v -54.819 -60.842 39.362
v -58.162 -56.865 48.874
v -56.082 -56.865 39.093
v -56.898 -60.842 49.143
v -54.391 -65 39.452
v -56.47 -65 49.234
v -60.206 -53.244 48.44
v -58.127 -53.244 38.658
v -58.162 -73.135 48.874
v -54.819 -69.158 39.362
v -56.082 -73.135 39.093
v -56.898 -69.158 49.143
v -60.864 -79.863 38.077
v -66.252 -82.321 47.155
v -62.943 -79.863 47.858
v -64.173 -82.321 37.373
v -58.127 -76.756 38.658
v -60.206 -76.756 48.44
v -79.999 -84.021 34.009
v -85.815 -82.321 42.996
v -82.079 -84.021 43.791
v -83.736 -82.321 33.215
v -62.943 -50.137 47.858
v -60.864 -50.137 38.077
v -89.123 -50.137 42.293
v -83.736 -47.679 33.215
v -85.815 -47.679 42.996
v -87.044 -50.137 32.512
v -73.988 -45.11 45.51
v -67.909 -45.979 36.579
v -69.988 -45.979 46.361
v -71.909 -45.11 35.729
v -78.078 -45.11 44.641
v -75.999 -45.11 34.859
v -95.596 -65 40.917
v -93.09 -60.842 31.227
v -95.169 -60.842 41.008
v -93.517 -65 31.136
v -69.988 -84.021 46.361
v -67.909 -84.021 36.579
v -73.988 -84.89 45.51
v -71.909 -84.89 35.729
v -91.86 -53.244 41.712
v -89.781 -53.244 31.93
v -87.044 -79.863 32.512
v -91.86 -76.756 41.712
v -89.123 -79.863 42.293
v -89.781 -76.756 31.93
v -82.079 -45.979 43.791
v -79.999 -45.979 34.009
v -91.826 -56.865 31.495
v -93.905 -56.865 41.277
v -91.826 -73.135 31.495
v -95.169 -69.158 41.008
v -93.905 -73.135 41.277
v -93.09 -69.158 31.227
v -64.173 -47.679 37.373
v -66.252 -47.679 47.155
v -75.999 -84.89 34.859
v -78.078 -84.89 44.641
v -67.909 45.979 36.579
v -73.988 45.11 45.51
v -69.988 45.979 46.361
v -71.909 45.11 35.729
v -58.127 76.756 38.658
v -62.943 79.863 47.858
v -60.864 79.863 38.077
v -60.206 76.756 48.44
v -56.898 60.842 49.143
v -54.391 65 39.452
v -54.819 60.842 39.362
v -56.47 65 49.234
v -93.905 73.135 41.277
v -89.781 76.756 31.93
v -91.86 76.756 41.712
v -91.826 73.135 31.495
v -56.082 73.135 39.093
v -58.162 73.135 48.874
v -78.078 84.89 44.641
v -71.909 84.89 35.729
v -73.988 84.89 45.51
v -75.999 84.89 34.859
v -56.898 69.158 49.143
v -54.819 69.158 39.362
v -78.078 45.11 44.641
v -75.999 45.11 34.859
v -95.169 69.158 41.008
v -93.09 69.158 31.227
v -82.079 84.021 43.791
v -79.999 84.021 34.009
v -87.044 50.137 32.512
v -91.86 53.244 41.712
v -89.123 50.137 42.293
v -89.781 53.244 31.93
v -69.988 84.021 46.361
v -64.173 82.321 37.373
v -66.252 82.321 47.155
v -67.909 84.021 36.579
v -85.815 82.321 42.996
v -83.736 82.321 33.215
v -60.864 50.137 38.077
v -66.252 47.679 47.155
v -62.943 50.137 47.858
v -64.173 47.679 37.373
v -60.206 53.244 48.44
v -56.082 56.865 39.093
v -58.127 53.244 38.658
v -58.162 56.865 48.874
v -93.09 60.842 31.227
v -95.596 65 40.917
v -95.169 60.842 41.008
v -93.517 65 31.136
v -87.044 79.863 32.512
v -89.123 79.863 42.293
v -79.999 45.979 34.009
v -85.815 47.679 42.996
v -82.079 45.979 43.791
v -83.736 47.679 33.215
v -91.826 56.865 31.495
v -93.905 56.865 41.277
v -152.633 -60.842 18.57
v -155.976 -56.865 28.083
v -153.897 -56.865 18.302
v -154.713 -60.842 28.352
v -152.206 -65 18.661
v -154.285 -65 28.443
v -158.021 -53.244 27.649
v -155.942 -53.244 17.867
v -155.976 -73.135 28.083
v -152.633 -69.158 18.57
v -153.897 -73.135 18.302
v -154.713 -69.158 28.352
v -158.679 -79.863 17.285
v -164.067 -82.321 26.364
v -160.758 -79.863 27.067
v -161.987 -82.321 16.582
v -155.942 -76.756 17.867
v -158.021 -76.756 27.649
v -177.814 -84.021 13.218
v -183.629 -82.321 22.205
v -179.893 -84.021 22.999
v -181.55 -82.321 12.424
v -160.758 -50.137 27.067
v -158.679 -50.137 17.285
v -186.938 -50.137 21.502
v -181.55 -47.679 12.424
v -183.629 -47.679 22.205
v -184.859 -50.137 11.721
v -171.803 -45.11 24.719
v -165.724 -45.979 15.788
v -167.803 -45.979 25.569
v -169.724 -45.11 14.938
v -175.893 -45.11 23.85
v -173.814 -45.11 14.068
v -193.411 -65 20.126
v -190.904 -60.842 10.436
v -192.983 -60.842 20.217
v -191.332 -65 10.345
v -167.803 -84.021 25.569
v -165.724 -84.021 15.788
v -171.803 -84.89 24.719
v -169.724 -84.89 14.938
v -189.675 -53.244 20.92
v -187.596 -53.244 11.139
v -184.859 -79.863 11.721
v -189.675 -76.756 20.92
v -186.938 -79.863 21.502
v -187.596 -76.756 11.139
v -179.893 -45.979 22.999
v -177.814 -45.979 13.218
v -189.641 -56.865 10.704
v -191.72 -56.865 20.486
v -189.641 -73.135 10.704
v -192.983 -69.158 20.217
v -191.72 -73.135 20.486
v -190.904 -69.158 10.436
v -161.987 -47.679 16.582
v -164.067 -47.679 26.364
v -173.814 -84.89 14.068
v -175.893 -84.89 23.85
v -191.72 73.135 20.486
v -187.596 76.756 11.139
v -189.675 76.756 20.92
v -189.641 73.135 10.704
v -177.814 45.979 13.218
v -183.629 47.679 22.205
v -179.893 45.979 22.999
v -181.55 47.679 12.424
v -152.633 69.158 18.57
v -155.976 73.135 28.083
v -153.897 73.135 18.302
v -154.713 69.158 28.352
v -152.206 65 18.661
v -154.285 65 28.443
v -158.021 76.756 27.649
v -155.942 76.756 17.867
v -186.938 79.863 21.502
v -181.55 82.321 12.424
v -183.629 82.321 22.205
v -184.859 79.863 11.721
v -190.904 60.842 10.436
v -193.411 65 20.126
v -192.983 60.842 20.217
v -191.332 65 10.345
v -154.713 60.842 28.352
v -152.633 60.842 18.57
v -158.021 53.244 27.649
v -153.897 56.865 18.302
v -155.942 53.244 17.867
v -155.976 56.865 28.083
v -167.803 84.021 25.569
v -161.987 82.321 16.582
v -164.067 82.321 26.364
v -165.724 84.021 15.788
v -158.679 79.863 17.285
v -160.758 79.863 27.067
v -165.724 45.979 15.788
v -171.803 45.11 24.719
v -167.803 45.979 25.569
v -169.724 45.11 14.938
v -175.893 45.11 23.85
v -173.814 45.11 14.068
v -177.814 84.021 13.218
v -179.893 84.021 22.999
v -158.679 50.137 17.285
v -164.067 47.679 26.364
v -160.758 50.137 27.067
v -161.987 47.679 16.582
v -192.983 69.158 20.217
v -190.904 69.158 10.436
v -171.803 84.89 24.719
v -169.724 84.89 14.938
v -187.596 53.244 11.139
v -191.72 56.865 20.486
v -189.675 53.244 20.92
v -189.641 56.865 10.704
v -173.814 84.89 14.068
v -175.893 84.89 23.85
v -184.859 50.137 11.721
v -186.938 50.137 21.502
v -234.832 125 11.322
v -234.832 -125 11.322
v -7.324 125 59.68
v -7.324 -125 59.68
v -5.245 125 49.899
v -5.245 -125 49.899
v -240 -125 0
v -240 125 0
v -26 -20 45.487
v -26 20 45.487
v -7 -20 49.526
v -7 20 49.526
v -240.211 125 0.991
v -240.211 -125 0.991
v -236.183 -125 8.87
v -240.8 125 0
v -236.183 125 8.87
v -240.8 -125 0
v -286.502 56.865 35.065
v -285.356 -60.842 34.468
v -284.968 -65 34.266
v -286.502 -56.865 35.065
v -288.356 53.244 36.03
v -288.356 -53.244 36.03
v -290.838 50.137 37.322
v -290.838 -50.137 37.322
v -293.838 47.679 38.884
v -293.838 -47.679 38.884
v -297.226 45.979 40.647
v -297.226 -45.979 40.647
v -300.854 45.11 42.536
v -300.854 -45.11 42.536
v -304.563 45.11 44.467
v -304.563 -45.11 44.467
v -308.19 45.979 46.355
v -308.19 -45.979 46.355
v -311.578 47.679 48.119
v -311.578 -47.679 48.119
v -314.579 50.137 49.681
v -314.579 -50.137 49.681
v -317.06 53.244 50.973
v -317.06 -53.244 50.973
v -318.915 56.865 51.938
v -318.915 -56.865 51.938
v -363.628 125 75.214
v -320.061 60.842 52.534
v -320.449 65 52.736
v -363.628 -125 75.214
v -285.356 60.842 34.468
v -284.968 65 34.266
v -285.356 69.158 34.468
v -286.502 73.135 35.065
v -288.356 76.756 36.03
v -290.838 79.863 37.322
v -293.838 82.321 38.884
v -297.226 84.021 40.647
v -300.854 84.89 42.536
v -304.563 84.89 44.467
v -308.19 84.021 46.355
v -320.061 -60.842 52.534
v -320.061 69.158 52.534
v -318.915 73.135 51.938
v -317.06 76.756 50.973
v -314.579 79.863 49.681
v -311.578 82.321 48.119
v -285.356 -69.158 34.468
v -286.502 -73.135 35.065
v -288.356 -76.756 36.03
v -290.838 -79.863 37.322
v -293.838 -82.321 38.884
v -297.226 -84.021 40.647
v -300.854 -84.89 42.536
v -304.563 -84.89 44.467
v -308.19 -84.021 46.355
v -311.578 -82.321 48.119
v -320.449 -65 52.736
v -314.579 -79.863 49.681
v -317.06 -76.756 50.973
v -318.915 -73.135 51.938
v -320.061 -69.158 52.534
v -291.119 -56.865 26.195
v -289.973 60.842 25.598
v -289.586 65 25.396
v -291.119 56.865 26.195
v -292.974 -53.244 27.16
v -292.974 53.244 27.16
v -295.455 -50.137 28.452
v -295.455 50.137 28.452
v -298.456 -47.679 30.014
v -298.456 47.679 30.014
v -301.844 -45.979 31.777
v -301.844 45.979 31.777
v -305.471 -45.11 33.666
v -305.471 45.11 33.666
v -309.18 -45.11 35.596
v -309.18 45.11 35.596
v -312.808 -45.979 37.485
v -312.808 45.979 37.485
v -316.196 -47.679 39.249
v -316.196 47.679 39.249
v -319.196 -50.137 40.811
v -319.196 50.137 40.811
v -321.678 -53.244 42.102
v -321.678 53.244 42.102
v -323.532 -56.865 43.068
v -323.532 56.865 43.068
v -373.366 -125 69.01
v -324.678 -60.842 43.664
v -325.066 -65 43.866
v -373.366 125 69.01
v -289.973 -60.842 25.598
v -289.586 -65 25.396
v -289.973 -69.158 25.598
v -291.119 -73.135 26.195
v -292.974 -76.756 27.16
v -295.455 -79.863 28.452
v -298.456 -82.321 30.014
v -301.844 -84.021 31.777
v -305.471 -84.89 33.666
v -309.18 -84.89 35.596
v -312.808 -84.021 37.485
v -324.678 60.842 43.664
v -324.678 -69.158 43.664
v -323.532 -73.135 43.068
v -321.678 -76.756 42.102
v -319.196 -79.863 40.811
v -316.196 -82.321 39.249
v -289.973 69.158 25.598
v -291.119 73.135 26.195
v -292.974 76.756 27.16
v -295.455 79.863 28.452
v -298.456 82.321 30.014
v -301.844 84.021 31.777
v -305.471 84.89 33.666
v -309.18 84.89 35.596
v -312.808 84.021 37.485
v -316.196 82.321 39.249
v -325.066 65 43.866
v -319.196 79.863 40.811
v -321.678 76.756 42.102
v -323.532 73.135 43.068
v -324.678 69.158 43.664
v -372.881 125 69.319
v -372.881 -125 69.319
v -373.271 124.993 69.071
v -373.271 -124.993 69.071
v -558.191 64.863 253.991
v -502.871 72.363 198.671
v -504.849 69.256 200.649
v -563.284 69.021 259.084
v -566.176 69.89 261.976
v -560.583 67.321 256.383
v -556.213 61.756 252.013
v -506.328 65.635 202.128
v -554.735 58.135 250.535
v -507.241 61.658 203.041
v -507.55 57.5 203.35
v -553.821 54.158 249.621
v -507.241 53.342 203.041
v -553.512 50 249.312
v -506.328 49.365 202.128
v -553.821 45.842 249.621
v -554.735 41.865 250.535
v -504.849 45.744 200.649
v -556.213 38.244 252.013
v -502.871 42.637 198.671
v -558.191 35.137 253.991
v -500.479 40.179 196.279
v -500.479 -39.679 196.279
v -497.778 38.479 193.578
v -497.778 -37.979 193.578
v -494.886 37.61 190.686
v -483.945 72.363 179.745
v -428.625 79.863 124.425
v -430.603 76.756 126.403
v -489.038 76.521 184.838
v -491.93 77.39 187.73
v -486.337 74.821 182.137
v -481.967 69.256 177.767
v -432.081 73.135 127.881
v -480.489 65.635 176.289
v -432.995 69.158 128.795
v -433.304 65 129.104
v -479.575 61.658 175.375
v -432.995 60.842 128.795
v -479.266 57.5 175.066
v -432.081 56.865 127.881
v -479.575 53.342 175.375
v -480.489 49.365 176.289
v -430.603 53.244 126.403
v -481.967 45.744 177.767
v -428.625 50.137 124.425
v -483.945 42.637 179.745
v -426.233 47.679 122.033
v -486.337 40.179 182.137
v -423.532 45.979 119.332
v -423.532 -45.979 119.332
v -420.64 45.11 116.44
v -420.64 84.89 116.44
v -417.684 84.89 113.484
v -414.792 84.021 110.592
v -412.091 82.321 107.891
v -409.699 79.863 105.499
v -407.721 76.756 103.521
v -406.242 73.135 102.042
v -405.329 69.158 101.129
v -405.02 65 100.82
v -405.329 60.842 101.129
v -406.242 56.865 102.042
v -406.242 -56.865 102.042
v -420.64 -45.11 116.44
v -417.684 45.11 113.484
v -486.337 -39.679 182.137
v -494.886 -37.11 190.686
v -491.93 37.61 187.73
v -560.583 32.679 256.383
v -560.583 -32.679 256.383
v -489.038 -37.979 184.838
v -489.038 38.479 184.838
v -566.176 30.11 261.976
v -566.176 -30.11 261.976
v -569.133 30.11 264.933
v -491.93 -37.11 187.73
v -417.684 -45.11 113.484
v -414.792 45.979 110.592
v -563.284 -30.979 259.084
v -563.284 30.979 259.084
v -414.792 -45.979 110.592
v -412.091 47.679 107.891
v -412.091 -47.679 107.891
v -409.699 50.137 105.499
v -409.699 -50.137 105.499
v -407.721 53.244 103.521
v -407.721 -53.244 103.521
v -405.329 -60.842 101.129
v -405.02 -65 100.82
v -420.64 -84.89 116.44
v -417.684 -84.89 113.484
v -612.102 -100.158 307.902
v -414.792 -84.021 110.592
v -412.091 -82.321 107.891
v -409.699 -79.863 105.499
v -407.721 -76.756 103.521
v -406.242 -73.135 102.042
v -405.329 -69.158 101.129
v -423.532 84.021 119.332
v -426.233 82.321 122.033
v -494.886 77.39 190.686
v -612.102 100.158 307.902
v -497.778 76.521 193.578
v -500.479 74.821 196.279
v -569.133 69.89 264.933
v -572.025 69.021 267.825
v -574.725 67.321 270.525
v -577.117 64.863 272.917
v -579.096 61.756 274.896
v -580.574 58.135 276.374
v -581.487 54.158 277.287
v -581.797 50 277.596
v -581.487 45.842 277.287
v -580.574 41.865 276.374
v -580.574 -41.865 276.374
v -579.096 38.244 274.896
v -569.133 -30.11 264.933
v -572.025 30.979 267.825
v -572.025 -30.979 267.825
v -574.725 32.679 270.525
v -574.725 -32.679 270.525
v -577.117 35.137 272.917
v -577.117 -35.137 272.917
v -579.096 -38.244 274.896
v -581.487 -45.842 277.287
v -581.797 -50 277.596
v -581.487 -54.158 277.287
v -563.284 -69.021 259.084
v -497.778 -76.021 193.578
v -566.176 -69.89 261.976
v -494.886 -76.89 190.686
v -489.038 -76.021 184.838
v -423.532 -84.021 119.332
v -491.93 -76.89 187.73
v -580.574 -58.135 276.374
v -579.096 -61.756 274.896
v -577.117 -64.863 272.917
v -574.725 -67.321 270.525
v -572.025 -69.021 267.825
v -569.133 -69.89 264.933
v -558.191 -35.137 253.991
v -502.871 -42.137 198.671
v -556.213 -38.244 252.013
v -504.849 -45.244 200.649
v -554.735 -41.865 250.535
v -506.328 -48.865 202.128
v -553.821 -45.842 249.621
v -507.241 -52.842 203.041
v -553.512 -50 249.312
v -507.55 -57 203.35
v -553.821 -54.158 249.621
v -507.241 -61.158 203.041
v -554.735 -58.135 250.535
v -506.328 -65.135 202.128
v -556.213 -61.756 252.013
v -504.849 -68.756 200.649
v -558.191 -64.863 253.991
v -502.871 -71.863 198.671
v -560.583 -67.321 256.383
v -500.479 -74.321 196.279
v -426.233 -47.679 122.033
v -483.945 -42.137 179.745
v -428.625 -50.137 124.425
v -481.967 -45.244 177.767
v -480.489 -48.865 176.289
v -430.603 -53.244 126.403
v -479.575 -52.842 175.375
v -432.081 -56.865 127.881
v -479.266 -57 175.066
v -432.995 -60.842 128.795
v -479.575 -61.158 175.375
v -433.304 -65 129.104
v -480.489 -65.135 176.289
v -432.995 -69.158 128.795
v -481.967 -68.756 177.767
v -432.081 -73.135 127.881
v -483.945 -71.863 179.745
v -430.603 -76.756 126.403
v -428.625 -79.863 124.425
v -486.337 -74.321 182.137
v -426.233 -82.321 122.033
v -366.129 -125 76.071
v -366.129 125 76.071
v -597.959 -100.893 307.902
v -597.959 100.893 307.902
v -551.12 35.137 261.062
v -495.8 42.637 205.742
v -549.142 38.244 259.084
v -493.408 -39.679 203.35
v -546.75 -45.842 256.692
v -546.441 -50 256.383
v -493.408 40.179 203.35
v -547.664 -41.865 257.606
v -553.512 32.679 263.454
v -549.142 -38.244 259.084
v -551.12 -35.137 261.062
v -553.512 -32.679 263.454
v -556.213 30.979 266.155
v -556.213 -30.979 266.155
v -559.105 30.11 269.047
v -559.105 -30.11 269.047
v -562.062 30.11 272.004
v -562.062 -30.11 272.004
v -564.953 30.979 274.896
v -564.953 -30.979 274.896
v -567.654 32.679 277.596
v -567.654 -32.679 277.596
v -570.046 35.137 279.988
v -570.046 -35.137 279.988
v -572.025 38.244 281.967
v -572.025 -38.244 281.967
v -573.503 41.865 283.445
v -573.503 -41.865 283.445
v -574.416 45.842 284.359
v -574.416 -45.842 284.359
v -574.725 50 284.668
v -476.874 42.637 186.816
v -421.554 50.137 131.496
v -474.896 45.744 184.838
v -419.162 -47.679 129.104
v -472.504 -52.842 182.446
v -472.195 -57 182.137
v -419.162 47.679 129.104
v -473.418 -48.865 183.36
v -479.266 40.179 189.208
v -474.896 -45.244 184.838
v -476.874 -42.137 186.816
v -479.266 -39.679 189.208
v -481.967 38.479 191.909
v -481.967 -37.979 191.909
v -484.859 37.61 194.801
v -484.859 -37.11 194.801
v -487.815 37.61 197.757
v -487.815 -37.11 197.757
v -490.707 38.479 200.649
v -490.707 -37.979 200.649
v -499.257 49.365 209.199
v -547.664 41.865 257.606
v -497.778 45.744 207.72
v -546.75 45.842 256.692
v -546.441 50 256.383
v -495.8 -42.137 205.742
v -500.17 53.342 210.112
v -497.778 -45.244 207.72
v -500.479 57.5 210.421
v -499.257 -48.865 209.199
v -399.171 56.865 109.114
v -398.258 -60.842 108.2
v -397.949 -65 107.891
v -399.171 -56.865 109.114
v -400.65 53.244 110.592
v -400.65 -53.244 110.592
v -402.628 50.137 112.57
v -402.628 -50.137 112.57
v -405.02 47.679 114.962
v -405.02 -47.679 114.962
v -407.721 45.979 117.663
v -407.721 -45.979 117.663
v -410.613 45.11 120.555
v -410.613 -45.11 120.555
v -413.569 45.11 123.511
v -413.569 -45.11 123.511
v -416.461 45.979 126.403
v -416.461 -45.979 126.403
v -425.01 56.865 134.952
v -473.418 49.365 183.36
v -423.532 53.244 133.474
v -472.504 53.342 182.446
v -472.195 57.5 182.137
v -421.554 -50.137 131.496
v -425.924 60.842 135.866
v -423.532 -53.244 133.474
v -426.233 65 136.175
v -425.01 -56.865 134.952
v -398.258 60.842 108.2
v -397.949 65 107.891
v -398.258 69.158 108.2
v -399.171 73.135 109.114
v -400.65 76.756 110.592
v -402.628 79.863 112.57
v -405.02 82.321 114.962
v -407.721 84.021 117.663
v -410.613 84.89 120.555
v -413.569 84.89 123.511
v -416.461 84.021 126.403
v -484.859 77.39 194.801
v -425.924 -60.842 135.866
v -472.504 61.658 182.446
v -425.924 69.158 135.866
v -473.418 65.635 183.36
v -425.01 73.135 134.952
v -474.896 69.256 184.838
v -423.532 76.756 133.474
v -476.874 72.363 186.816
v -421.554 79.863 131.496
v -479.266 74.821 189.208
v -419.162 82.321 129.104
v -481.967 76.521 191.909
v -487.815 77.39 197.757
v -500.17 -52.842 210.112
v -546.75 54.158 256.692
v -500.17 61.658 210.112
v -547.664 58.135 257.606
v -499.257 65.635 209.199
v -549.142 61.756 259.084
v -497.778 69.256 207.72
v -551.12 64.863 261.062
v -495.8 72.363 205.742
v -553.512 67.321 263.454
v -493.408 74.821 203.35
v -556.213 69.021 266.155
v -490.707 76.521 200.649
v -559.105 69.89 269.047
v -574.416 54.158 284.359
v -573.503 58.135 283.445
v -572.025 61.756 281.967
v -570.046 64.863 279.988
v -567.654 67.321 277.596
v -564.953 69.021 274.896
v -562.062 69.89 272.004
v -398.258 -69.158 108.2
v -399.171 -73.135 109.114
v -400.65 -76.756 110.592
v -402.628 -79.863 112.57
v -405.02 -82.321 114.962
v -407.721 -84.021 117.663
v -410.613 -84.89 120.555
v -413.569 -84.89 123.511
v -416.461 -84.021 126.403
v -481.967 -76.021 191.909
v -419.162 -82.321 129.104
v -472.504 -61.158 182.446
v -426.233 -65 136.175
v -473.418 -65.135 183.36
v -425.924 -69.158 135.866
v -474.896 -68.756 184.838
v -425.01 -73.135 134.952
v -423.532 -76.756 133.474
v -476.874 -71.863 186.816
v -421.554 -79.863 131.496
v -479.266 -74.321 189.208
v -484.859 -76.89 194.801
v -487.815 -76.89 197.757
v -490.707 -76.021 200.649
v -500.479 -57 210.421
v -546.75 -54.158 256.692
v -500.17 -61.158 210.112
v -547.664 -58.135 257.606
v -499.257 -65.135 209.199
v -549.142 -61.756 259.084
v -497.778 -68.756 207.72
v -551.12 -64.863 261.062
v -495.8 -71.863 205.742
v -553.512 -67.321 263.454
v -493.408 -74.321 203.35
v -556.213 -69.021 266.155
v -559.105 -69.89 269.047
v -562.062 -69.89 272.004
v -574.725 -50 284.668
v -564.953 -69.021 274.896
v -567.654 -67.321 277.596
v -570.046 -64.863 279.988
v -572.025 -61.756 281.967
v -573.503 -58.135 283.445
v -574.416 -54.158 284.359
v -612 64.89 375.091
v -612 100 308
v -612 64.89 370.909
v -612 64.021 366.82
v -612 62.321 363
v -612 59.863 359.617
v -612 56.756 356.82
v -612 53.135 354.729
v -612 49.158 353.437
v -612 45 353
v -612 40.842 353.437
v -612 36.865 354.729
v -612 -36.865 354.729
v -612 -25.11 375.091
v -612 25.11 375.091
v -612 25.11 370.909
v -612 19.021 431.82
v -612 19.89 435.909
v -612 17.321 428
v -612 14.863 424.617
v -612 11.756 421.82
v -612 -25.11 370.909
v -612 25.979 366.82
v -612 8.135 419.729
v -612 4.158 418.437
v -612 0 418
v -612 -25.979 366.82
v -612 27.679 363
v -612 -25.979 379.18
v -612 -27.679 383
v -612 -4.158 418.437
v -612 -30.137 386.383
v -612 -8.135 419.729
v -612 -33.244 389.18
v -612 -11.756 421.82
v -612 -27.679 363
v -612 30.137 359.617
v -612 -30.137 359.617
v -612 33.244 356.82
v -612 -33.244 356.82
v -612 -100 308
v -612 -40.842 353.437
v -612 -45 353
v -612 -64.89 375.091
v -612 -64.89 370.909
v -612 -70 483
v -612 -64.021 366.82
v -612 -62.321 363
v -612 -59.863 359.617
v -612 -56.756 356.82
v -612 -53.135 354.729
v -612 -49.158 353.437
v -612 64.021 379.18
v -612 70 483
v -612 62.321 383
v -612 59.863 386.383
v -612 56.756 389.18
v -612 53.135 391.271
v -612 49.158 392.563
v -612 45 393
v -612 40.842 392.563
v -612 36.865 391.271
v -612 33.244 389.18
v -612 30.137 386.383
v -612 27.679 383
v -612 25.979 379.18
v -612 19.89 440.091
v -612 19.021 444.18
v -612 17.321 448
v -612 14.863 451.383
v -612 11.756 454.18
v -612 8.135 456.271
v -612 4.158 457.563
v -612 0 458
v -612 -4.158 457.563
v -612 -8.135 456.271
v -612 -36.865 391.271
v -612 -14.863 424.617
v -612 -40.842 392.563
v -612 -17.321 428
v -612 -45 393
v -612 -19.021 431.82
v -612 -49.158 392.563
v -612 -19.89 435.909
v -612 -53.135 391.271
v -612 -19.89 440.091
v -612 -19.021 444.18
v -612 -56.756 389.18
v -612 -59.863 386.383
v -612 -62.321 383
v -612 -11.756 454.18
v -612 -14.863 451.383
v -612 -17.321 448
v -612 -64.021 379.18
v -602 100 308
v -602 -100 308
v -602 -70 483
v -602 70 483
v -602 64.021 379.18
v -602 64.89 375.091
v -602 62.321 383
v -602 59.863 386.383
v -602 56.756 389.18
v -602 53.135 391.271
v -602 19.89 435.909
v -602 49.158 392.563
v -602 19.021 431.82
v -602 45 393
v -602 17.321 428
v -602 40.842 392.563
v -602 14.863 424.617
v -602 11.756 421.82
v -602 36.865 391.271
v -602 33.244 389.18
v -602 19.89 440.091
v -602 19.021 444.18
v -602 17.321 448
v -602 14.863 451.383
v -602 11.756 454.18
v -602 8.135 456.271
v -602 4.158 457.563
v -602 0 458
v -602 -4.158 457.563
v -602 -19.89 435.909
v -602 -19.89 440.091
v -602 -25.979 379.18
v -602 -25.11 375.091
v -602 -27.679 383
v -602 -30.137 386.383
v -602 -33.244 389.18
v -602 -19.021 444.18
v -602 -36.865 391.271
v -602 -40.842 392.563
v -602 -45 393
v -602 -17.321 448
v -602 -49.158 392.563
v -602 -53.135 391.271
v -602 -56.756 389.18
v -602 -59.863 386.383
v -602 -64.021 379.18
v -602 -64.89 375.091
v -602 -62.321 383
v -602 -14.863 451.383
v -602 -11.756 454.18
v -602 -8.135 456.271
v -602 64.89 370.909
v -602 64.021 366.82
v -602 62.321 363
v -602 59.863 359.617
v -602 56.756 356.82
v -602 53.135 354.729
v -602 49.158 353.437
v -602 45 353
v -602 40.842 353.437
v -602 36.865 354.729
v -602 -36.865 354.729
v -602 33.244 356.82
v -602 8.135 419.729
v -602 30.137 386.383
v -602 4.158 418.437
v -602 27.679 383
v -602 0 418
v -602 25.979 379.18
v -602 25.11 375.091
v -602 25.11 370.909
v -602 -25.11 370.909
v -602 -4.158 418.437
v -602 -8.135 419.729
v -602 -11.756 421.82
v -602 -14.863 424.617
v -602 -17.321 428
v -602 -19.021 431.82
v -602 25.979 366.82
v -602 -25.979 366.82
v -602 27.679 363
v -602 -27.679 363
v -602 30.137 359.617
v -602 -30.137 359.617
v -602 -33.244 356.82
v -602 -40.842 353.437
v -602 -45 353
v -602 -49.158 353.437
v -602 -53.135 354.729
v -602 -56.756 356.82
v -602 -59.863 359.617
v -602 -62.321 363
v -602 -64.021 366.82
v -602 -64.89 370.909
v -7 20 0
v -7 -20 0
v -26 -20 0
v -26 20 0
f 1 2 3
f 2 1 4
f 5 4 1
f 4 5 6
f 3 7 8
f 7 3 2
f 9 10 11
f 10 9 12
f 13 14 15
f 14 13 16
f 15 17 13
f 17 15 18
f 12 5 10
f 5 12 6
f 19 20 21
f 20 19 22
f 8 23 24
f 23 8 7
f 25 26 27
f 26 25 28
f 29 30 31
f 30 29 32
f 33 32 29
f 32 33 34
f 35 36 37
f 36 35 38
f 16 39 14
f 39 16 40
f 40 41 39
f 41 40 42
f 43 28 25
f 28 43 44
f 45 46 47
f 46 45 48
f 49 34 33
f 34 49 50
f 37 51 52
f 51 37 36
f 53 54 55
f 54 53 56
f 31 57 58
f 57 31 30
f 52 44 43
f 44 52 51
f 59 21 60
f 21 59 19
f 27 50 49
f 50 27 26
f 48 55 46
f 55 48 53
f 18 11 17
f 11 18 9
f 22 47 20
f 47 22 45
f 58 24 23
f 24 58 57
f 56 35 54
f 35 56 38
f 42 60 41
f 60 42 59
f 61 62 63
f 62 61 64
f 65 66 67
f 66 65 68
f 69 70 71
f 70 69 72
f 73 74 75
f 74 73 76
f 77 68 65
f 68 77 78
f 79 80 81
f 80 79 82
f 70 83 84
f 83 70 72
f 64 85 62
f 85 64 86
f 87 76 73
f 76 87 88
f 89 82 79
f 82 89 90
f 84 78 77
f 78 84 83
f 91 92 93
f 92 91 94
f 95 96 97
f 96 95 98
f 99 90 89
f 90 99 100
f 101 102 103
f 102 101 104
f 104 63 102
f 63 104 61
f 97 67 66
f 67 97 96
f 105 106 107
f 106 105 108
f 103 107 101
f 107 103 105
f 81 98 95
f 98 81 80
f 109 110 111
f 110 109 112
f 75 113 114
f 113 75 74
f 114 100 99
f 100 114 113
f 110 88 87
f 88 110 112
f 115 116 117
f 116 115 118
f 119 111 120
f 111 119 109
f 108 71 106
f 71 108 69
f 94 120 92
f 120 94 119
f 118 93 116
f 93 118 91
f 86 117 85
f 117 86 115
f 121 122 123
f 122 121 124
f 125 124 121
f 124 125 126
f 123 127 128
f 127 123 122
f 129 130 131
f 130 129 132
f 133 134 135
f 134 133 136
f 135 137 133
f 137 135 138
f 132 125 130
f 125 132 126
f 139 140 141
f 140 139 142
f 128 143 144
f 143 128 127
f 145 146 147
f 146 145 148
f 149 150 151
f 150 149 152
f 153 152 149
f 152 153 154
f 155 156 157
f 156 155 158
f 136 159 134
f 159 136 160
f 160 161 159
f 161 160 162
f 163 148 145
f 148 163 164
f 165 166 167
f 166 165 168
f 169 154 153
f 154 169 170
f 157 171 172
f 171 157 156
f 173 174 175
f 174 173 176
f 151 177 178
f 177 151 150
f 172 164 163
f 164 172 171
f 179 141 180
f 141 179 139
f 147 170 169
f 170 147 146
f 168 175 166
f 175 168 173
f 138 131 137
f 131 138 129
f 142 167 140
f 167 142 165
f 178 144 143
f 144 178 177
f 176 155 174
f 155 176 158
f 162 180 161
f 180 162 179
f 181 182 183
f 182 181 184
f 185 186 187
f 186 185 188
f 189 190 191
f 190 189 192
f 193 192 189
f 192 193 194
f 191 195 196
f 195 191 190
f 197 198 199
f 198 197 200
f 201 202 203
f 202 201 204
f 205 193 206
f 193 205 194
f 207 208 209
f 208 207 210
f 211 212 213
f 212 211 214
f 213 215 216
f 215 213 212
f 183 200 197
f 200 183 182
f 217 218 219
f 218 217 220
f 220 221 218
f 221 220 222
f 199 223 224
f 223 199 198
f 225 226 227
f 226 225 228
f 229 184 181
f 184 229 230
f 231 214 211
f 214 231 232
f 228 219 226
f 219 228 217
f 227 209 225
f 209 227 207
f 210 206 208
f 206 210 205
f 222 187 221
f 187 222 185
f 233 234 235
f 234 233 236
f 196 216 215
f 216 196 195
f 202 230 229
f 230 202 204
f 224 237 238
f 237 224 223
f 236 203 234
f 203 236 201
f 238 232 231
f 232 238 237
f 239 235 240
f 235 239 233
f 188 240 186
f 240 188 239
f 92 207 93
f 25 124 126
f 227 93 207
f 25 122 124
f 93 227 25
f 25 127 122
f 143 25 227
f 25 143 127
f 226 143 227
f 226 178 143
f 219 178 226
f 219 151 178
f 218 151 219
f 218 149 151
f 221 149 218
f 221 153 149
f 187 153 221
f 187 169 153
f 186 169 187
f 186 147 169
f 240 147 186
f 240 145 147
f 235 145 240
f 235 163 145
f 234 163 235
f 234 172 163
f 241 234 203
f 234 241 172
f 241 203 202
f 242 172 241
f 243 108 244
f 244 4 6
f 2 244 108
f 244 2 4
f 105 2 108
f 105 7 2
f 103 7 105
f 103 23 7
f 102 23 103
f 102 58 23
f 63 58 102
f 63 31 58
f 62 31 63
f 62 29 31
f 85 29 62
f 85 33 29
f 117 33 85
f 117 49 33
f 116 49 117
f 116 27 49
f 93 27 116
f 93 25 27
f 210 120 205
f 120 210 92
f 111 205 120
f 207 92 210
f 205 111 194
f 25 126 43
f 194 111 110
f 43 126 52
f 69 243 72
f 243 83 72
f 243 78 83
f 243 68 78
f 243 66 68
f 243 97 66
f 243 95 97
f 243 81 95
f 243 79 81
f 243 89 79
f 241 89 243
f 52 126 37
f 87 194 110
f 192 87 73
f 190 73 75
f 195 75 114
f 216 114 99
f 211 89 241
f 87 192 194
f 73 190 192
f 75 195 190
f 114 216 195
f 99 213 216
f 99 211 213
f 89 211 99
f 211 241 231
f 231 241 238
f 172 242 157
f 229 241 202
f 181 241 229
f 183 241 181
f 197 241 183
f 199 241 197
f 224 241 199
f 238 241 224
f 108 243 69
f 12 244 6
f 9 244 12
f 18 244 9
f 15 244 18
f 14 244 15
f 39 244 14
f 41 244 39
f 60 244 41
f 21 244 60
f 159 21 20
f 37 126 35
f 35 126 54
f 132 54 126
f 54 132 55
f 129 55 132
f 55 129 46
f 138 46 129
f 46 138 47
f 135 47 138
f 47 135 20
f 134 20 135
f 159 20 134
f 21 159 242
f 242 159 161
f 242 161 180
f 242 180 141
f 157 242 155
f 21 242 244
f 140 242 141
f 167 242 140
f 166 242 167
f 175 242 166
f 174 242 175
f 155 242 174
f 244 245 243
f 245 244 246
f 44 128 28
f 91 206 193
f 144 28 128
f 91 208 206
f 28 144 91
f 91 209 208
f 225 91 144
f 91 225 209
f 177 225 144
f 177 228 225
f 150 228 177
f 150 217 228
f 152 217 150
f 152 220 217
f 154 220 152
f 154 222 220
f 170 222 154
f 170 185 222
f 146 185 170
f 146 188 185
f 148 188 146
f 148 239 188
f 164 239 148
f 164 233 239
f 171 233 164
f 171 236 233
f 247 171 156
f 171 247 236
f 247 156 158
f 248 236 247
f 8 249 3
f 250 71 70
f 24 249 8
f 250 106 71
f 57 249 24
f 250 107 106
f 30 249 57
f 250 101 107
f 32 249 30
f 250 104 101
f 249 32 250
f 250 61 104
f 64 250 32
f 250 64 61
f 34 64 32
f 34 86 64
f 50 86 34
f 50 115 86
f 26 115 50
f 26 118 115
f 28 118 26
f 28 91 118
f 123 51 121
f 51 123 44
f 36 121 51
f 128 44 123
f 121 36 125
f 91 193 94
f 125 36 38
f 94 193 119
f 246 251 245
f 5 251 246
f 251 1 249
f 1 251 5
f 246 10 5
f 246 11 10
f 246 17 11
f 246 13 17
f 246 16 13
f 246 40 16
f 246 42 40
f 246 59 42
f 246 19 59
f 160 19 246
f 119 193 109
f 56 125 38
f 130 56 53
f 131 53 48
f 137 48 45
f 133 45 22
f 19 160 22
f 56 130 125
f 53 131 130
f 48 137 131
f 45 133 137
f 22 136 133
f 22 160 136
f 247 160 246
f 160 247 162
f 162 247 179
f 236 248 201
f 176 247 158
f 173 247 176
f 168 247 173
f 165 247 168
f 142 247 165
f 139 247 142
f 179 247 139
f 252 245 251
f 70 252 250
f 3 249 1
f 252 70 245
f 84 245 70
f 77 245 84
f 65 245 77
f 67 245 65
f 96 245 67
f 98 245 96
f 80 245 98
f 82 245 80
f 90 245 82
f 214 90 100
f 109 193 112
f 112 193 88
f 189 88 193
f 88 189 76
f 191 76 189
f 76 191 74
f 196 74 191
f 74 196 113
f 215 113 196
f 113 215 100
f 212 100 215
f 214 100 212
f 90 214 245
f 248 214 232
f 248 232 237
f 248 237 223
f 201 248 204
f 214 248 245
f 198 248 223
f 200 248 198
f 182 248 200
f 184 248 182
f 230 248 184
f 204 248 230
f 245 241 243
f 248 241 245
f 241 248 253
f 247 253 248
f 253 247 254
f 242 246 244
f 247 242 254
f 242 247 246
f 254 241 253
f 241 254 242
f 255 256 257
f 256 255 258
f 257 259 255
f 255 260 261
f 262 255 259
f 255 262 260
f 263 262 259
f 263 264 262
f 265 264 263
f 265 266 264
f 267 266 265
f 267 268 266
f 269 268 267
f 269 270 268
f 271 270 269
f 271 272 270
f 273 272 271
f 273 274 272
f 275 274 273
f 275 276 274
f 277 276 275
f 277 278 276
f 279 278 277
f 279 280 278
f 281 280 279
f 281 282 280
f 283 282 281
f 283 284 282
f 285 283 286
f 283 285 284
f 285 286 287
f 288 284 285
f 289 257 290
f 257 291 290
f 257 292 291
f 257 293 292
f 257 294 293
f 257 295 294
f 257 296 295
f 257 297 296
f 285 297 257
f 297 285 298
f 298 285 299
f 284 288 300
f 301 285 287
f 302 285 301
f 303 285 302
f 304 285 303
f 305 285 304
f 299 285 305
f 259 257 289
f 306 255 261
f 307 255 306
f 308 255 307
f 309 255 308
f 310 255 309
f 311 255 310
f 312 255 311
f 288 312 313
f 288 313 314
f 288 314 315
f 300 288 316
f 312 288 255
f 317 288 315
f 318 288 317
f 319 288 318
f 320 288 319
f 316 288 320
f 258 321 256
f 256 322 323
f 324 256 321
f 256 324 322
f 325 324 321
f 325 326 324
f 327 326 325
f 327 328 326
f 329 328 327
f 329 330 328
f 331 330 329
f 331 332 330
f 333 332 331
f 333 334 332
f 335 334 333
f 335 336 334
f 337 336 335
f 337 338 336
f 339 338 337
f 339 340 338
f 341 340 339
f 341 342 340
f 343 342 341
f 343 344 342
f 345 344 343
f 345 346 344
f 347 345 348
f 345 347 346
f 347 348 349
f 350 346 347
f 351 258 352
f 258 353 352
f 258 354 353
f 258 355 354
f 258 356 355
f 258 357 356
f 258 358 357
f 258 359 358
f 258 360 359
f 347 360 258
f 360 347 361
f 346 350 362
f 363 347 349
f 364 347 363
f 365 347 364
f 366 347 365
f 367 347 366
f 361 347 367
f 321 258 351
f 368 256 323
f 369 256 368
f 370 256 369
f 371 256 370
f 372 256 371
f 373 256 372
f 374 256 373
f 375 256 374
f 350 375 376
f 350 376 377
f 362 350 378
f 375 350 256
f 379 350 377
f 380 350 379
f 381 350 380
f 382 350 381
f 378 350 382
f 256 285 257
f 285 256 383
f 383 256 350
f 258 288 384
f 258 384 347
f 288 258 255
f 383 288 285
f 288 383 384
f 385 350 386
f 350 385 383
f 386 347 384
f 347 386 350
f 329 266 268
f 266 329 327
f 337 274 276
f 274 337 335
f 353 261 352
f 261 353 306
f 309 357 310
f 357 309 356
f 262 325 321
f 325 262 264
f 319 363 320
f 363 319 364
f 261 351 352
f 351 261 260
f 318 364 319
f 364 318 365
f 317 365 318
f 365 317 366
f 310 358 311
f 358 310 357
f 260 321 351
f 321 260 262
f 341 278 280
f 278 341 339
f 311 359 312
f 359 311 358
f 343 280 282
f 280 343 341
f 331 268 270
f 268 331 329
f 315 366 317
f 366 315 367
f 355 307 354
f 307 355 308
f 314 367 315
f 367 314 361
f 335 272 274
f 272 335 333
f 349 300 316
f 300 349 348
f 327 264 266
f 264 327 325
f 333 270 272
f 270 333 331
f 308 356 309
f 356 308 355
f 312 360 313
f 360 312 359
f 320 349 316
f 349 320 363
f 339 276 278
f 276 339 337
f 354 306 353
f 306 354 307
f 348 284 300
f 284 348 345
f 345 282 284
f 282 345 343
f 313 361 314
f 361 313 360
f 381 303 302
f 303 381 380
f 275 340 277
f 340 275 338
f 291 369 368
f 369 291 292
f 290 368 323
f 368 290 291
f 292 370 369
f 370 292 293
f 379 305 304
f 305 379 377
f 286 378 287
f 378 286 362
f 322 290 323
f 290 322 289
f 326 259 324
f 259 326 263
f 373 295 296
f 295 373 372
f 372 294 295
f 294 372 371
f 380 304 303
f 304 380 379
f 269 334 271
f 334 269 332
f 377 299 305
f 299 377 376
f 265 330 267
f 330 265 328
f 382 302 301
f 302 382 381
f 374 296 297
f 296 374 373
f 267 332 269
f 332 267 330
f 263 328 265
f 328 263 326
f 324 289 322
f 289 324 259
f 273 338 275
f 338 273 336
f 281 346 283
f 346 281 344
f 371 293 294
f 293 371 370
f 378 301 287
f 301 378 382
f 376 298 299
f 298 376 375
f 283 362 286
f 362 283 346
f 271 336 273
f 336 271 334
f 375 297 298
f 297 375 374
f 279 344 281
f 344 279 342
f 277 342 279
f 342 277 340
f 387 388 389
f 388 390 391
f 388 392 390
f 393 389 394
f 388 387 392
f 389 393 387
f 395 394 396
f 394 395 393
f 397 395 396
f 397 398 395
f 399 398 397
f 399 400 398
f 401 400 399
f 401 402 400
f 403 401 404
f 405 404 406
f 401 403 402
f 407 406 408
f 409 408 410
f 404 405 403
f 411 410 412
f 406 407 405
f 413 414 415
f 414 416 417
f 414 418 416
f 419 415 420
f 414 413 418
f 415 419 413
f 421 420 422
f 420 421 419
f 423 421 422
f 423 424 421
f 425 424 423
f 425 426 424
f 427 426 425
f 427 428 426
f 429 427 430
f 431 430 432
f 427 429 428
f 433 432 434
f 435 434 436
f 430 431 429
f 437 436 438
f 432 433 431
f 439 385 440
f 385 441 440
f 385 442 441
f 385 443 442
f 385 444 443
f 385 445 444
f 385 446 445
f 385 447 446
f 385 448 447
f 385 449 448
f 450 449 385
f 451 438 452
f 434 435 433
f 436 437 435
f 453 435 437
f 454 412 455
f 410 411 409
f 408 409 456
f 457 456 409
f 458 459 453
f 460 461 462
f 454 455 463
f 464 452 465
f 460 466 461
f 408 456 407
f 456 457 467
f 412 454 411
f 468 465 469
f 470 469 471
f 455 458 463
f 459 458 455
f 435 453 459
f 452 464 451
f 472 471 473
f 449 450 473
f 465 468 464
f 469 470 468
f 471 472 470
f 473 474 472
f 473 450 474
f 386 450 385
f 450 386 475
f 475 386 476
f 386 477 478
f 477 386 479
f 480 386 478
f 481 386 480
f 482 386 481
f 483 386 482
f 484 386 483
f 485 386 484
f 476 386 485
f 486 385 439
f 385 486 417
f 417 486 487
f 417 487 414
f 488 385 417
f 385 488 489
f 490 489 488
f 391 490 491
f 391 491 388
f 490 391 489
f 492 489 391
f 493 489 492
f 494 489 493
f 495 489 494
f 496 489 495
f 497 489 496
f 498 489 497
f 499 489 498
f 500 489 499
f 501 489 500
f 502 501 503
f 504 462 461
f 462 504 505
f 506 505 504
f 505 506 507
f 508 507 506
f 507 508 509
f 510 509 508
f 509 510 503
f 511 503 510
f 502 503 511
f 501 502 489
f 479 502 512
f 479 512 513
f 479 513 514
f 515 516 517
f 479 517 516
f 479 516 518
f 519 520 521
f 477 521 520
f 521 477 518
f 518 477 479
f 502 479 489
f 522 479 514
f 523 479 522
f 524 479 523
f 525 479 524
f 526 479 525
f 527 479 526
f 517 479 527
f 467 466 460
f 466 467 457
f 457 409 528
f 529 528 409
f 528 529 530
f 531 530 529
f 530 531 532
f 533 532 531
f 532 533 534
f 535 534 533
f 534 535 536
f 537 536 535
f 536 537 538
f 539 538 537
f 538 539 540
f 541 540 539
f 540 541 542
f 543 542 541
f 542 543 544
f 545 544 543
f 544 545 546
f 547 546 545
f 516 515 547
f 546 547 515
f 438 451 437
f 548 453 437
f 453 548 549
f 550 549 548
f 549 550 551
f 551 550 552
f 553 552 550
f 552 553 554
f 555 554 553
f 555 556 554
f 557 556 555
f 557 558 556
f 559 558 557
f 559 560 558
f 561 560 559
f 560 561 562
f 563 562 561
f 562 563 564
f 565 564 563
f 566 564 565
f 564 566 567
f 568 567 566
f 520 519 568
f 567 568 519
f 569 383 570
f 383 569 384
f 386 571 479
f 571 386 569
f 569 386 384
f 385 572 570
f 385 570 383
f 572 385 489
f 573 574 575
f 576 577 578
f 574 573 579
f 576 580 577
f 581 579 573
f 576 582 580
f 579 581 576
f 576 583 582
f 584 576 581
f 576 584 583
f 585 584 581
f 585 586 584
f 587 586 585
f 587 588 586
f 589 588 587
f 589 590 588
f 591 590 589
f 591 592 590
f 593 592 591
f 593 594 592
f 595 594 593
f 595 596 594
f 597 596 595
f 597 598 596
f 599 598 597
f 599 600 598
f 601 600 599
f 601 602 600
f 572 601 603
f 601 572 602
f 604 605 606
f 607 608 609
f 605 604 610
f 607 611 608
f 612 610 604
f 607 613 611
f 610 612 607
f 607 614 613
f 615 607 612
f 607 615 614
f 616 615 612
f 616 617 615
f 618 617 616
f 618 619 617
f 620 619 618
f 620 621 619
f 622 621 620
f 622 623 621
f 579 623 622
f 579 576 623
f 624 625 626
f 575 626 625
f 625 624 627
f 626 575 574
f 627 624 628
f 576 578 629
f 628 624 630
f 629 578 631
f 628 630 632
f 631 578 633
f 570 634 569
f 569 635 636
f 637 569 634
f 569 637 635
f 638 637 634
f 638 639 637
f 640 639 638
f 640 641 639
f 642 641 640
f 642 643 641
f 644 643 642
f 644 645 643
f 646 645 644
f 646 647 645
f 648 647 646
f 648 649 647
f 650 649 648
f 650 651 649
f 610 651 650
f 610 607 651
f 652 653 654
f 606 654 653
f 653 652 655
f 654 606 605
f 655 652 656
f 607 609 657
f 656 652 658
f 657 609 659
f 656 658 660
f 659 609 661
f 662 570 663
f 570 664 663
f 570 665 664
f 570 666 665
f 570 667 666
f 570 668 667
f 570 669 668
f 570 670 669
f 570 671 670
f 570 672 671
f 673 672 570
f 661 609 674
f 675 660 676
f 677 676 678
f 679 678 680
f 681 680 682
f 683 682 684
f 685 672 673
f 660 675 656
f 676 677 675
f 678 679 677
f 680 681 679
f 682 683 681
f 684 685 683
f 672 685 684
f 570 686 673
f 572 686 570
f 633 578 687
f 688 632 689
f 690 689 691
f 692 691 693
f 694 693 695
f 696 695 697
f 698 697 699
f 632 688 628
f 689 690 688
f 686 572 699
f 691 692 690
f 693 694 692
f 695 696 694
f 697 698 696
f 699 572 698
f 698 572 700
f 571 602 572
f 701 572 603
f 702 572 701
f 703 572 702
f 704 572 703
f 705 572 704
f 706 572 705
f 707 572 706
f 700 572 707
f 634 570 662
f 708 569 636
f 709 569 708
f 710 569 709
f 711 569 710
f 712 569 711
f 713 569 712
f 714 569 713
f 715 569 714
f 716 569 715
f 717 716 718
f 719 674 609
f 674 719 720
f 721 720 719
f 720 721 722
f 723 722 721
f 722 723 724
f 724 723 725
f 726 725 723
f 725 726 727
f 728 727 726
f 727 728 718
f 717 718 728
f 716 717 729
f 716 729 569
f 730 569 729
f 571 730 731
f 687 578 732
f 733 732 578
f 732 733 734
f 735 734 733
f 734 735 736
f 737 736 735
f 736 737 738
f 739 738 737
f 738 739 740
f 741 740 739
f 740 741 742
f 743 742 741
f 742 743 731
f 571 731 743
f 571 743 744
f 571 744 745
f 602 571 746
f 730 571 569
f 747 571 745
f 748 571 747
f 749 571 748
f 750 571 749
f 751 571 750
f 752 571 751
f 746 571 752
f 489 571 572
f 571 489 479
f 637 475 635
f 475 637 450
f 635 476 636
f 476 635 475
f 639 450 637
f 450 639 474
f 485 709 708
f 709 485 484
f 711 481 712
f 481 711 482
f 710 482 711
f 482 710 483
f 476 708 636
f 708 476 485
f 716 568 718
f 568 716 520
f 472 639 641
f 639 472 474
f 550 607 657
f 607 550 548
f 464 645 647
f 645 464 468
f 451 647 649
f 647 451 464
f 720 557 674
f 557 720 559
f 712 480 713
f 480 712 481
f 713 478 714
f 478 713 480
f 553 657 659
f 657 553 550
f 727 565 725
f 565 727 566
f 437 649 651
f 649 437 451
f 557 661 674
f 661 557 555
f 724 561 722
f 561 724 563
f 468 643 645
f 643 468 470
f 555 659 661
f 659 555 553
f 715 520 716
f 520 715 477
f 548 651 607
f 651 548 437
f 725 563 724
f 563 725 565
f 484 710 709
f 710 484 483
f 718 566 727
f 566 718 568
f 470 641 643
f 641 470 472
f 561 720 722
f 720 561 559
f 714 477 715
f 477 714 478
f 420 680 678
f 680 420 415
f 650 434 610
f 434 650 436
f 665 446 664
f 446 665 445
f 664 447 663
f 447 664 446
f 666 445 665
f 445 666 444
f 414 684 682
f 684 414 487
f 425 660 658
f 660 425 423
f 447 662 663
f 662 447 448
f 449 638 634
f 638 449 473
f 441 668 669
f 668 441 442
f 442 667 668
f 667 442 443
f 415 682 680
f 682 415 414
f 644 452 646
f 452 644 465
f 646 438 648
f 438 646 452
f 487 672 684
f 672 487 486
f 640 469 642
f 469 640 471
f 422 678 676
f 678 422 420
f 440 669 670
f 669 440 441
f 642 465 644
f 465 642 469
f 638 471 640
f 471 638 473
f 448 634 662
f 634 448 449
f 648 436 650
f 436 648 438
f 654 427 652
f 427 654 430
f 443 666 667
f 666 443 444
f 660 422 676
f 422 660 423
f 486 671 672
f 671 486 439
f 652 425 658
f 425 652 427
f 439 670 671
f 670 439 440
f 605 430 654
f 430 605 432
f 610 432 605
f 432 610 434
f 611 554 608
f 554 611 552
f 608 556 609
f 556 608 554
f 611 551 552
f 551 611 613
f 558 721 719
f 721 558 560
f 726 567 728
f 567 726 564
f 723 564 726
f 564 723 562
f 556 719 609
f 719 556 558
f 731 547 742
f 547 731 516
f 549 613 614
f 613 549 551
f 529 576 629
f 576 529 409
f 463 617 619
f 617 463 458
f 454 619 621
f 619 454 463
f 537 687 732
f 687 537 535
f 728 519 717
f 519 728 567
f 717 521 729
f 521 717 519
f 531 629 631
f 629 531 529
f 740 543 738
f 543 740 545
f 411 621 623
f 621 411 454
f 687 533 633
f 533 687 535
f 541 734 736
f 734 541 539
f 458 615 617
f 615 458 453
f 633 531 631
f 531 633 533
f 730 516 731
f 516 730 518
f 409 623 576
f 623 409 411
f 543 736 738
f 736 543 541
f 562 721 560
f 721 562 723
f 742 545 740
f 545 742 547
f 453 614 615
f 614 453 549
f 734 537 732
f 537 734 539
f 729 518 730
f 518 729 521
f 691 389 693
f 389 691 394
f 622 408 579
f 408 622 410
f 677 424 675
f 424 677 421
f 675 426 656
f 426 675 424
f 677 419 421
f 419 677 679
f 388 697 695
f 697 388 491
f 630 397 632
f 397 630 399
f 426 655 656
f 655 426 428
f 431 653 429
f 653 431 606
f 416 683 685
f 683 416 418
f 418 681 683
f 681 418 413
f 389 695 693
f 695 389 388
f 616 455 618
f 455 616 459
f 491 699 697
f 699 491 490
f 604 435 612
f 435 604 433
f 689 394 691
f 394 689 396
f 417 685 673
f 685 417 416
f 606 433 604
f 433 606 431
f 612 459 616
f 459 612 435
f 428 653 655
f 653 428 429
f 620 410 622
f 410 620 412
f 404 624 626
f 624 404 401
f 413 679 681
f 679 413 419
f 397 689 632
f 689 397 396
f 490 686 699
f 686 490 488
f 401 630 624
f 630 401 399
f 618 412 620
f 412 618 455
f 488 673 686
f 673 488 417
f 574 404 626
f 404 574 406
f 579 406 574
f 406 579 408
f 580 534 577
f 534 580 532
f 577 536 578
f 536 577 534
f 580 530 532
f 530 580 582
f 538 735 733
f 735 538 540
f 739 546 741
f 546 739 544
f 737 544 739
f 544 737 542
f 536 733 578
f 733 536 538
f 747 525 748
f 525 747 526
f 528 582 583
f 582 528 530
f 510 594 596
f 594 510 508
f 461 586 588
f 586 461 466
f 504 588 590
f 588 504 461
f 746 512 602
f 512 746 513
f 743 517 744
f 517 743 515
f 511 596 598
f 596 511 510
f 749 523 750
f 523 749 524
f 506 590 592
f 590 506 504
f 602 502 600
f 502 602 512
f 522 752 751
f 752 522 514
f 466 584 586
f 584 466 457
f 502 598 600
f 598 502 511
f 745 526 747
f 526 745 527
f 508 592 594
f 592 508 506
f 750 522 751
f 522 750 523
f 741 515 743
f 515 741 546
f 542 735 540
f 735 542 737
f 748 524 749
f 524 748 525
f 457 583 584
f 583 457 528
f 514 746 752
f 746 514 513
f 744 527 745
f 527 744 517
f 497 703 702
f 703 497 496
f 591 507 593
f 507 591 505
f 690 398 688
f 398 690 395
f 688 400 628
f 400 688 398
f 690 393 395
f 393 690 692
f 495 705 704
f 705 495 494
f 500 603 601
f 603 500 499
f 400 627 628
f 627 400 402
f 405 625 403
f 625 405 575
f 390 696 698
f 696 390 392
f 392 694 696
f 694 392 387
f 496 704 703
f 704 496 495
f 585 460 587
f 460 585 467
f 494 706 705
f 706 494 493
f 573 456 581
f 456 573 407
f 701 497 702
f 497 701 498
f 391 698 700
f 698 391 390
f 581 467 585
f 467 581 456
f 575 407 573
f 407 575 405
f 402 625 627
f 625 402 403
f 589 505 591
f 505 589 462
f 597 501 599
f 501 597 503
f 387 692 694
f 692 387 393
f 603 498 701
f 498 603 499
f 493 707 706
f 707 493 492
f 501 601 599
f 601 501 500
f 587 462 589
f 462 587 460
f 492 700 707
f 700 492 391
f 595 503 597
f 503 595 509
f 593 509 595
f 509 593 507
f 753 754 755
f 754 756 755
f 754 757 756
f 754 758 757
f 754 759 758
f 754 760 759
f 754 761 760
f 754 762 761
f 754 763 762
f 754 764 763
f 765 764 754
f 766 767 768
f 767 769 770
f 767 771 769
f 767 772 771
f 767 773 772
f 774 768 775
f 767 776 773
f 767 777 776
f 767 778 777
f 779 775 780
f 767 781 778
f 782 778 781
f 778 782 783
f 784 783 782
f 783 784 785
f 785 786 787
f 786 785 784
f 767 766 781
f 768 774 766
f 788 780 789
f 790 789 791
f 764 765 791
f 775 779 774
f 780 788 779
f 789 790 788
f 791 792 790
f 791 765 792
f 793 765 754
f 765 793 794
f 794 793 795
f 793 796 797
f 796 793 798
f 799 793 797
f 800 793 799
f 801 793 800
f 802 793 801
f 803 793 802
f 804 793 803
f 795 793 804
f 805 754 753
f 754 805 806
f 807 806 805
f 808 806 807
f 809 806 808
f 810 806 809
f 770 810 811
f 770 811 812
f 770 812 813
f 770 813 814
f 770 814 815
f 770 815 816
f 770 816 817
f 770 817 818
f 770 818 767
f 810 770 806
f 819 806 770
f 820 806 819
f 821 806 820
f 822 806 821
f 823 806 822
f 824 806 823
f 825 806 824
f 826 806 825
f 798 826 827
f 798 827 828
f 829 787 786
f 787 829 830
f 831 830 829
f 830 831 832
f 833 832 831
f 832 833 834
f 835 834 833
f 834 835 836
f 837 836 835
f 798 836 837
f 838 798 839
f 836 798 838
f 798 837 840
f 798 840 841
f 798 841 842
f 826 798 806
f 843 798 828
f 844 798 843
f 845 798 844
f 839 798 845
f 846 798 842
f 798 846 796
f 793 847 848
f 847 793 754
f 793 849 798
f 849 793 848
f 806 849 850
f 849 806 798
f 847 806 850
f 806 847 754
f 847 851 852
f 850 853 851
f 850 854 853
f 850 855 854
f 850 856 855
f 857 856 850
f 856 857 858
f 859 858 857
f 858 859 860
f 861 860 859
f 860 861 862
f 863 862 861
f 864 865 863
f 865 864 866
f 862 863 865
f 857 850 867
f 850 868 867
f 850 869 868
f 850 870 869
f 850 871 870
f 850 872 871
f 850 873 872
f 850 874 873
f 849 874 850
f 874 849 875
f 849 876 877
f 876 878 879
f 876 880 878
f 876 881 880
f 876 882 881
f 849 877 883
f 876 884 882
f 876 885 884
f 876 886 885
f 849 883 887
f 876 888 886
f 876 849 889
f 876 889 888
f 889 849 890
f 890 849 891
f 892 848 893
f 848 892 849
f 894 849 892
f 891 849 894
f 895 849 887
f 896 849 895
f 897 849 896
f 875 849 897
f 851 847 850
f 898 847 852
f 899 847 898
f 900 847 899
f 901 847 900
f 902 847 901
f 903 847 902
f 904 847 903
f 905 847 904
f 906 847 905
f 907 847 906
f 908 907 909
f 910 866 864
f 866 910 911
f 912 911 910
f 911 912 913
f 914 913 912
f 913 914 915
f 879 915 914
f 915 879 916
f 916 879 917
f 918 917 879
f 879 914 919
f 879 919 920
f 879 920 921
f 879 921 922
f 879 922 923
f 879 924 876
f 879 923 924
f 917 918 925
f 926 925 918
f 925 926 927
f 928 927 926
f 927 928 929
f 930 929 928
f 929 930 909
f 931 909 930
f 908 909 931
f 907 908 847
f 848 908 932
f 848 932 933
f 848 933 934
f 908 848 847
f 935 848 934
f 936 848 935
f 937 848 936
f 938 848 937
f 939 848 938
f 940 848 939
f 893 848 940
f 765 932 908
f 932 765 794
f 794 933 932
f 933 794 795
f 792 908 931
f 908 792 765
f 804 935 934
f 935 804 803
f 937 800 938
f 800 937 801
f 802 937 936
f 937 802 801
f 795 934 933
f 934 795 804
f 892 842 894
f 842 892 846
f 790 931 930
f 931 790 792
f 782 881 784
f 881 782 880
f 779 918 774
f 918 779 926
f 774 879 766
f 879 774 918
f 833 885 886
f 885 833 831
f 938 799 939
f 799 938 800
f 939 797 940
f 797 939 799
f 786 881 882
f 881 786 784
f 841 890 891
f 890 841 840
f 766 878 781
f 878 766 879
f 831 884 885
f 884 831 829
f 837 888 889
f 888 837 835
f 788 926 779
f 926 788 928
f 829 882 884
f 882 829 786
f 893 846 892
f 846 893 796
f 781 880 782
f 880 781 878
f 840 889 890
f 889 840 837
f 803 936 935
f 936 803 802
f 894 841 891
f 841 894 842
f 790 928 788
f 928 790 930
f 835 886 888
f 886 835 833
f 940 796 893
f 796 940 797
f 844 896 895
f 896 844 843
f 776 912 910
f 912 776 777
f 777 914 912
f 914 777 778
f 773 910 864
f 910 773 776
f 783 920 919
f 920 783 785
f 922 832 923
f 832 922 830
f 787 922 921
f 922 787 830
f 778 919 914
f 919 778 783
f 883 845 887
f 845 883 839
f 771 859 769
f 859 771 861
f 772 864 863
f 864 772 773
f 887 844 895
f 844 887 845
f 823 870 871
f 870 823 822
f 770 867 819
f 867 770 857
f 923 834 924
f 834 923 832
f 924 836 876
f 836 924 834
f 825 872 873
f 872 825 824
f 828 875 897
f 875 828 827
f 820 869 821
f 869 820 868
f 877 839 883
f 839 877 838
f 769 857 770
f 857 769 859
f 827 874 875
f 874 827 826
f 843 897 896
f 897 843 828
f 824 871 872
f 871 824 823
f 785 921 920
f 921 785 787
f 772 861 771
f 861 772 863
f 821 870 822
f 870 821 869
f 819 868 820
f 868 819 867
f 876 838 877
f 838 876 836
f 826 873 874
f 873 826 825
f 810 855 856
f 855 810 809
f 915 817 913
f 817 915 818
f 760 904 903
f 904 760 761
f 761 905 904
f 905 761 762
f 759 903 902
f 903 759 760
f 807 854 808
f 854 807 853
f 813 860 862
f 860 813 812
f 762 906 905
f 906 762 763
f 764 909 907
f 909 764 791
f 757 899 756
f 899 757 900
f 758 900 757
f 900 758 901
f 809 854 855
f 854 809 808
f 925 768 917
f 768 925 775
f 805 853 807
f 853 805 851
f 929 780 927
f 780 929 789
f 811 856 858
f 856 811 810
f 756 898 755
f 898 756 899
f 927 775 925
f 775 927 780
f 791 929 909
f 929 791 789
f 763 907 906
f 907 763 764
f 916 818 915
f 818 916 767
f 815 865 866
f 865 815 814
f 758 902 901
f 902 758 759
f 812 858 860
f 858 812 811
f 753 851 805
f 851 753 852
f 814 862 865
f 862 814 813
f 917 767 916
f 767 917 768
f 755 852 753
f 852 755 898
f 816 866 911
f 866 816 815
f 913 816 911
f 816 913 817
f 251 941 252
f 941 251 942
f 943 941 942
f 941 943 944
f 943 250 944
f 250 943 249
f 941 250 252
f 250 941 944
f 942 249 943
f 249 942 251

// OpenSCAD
seat();

seat2();

module seat(){
    
}

module seat2() color("sienna"){
    translate([-26,-20,0]) cube([19,40,50]);
    difference(){
        translate([-240,-125,0]) rotate([0,-12,0]) cube([240,250,10]);
        translate([0,90,-1]) rotate([0,0,45]) cube([50,50,12]);
        translate([0,-160,-1]) rotate([0,0,45]) cube([50,50,12]);
        translate([-252,-126,0]) rotate([0,27.5,0]) cube([10,252,20]);
        rotate([0,-12,0]){
            translate([-65,-65,-1]) cylinder(r=20,h=100);
            translate([-65,65,-1]) cylinder(r=20,h=100);
            translate([-165,-65,-1]) cylinder(r=20,h=100);
            translate([-165,65,-1]) cylinder(r=20,h=100);
        }
    }
    
    translate([-240.8,0,0]) rotate([0,27.5,0]) difference(){
        translate([-150,-125,0]) cube([150,250,10]);
        translate([-161,-126,0]) rotate([0,30,0]) cube([10,252,20]);
        translate([-75,-65,-1]) cylinder(r=20,h=12);
        translate([-75,65,-1]) cylinder(r=20,h=12);
    }
    
    translate([-373.2,0,69]) rotate([0,45,0]) difference(){
        linear_extrude(height=10){
            polygon([[0,-125],[0,125],[-340,100],[-340,-100]]);
        }
        translate([-352,-126,0]) rotate([0,45,0]) cube([10,252,30]);
        translate([-65,-65,-1]) cylinder(r=20,h=12);
        translate([-65,65,-1]) cylinder(r=20,h=12);
        translate([-170,-57,-1]) cylinder(r=20,h=12);
        translate([-170,57.5,-1]) cylinder(r=20,h=12);
        translate([-275,-50,-1]) cylinder(r=20,h=12);
        translate([-275,50,-1]) cylinder(r=20,h=12);
    }
    
    translate([-612,0,308]) rotate([0,90,0]) difference(){
        linear_extrude(height=10){
            polygon([[0,-100],[0,100],[-175,70],[-175,-70]]);
        }
        translate([-352,-126,0]) rotate([0,45,0]) cube([10,252,30]);
        translate([-65,-45,-1]) cylinder(r=20,h=12);
        translate([-130,0,-1]) cylinder(r=20,h=12);
        translate([-65,45,-1]) cylinder(r=20,h=12);
    }
}
